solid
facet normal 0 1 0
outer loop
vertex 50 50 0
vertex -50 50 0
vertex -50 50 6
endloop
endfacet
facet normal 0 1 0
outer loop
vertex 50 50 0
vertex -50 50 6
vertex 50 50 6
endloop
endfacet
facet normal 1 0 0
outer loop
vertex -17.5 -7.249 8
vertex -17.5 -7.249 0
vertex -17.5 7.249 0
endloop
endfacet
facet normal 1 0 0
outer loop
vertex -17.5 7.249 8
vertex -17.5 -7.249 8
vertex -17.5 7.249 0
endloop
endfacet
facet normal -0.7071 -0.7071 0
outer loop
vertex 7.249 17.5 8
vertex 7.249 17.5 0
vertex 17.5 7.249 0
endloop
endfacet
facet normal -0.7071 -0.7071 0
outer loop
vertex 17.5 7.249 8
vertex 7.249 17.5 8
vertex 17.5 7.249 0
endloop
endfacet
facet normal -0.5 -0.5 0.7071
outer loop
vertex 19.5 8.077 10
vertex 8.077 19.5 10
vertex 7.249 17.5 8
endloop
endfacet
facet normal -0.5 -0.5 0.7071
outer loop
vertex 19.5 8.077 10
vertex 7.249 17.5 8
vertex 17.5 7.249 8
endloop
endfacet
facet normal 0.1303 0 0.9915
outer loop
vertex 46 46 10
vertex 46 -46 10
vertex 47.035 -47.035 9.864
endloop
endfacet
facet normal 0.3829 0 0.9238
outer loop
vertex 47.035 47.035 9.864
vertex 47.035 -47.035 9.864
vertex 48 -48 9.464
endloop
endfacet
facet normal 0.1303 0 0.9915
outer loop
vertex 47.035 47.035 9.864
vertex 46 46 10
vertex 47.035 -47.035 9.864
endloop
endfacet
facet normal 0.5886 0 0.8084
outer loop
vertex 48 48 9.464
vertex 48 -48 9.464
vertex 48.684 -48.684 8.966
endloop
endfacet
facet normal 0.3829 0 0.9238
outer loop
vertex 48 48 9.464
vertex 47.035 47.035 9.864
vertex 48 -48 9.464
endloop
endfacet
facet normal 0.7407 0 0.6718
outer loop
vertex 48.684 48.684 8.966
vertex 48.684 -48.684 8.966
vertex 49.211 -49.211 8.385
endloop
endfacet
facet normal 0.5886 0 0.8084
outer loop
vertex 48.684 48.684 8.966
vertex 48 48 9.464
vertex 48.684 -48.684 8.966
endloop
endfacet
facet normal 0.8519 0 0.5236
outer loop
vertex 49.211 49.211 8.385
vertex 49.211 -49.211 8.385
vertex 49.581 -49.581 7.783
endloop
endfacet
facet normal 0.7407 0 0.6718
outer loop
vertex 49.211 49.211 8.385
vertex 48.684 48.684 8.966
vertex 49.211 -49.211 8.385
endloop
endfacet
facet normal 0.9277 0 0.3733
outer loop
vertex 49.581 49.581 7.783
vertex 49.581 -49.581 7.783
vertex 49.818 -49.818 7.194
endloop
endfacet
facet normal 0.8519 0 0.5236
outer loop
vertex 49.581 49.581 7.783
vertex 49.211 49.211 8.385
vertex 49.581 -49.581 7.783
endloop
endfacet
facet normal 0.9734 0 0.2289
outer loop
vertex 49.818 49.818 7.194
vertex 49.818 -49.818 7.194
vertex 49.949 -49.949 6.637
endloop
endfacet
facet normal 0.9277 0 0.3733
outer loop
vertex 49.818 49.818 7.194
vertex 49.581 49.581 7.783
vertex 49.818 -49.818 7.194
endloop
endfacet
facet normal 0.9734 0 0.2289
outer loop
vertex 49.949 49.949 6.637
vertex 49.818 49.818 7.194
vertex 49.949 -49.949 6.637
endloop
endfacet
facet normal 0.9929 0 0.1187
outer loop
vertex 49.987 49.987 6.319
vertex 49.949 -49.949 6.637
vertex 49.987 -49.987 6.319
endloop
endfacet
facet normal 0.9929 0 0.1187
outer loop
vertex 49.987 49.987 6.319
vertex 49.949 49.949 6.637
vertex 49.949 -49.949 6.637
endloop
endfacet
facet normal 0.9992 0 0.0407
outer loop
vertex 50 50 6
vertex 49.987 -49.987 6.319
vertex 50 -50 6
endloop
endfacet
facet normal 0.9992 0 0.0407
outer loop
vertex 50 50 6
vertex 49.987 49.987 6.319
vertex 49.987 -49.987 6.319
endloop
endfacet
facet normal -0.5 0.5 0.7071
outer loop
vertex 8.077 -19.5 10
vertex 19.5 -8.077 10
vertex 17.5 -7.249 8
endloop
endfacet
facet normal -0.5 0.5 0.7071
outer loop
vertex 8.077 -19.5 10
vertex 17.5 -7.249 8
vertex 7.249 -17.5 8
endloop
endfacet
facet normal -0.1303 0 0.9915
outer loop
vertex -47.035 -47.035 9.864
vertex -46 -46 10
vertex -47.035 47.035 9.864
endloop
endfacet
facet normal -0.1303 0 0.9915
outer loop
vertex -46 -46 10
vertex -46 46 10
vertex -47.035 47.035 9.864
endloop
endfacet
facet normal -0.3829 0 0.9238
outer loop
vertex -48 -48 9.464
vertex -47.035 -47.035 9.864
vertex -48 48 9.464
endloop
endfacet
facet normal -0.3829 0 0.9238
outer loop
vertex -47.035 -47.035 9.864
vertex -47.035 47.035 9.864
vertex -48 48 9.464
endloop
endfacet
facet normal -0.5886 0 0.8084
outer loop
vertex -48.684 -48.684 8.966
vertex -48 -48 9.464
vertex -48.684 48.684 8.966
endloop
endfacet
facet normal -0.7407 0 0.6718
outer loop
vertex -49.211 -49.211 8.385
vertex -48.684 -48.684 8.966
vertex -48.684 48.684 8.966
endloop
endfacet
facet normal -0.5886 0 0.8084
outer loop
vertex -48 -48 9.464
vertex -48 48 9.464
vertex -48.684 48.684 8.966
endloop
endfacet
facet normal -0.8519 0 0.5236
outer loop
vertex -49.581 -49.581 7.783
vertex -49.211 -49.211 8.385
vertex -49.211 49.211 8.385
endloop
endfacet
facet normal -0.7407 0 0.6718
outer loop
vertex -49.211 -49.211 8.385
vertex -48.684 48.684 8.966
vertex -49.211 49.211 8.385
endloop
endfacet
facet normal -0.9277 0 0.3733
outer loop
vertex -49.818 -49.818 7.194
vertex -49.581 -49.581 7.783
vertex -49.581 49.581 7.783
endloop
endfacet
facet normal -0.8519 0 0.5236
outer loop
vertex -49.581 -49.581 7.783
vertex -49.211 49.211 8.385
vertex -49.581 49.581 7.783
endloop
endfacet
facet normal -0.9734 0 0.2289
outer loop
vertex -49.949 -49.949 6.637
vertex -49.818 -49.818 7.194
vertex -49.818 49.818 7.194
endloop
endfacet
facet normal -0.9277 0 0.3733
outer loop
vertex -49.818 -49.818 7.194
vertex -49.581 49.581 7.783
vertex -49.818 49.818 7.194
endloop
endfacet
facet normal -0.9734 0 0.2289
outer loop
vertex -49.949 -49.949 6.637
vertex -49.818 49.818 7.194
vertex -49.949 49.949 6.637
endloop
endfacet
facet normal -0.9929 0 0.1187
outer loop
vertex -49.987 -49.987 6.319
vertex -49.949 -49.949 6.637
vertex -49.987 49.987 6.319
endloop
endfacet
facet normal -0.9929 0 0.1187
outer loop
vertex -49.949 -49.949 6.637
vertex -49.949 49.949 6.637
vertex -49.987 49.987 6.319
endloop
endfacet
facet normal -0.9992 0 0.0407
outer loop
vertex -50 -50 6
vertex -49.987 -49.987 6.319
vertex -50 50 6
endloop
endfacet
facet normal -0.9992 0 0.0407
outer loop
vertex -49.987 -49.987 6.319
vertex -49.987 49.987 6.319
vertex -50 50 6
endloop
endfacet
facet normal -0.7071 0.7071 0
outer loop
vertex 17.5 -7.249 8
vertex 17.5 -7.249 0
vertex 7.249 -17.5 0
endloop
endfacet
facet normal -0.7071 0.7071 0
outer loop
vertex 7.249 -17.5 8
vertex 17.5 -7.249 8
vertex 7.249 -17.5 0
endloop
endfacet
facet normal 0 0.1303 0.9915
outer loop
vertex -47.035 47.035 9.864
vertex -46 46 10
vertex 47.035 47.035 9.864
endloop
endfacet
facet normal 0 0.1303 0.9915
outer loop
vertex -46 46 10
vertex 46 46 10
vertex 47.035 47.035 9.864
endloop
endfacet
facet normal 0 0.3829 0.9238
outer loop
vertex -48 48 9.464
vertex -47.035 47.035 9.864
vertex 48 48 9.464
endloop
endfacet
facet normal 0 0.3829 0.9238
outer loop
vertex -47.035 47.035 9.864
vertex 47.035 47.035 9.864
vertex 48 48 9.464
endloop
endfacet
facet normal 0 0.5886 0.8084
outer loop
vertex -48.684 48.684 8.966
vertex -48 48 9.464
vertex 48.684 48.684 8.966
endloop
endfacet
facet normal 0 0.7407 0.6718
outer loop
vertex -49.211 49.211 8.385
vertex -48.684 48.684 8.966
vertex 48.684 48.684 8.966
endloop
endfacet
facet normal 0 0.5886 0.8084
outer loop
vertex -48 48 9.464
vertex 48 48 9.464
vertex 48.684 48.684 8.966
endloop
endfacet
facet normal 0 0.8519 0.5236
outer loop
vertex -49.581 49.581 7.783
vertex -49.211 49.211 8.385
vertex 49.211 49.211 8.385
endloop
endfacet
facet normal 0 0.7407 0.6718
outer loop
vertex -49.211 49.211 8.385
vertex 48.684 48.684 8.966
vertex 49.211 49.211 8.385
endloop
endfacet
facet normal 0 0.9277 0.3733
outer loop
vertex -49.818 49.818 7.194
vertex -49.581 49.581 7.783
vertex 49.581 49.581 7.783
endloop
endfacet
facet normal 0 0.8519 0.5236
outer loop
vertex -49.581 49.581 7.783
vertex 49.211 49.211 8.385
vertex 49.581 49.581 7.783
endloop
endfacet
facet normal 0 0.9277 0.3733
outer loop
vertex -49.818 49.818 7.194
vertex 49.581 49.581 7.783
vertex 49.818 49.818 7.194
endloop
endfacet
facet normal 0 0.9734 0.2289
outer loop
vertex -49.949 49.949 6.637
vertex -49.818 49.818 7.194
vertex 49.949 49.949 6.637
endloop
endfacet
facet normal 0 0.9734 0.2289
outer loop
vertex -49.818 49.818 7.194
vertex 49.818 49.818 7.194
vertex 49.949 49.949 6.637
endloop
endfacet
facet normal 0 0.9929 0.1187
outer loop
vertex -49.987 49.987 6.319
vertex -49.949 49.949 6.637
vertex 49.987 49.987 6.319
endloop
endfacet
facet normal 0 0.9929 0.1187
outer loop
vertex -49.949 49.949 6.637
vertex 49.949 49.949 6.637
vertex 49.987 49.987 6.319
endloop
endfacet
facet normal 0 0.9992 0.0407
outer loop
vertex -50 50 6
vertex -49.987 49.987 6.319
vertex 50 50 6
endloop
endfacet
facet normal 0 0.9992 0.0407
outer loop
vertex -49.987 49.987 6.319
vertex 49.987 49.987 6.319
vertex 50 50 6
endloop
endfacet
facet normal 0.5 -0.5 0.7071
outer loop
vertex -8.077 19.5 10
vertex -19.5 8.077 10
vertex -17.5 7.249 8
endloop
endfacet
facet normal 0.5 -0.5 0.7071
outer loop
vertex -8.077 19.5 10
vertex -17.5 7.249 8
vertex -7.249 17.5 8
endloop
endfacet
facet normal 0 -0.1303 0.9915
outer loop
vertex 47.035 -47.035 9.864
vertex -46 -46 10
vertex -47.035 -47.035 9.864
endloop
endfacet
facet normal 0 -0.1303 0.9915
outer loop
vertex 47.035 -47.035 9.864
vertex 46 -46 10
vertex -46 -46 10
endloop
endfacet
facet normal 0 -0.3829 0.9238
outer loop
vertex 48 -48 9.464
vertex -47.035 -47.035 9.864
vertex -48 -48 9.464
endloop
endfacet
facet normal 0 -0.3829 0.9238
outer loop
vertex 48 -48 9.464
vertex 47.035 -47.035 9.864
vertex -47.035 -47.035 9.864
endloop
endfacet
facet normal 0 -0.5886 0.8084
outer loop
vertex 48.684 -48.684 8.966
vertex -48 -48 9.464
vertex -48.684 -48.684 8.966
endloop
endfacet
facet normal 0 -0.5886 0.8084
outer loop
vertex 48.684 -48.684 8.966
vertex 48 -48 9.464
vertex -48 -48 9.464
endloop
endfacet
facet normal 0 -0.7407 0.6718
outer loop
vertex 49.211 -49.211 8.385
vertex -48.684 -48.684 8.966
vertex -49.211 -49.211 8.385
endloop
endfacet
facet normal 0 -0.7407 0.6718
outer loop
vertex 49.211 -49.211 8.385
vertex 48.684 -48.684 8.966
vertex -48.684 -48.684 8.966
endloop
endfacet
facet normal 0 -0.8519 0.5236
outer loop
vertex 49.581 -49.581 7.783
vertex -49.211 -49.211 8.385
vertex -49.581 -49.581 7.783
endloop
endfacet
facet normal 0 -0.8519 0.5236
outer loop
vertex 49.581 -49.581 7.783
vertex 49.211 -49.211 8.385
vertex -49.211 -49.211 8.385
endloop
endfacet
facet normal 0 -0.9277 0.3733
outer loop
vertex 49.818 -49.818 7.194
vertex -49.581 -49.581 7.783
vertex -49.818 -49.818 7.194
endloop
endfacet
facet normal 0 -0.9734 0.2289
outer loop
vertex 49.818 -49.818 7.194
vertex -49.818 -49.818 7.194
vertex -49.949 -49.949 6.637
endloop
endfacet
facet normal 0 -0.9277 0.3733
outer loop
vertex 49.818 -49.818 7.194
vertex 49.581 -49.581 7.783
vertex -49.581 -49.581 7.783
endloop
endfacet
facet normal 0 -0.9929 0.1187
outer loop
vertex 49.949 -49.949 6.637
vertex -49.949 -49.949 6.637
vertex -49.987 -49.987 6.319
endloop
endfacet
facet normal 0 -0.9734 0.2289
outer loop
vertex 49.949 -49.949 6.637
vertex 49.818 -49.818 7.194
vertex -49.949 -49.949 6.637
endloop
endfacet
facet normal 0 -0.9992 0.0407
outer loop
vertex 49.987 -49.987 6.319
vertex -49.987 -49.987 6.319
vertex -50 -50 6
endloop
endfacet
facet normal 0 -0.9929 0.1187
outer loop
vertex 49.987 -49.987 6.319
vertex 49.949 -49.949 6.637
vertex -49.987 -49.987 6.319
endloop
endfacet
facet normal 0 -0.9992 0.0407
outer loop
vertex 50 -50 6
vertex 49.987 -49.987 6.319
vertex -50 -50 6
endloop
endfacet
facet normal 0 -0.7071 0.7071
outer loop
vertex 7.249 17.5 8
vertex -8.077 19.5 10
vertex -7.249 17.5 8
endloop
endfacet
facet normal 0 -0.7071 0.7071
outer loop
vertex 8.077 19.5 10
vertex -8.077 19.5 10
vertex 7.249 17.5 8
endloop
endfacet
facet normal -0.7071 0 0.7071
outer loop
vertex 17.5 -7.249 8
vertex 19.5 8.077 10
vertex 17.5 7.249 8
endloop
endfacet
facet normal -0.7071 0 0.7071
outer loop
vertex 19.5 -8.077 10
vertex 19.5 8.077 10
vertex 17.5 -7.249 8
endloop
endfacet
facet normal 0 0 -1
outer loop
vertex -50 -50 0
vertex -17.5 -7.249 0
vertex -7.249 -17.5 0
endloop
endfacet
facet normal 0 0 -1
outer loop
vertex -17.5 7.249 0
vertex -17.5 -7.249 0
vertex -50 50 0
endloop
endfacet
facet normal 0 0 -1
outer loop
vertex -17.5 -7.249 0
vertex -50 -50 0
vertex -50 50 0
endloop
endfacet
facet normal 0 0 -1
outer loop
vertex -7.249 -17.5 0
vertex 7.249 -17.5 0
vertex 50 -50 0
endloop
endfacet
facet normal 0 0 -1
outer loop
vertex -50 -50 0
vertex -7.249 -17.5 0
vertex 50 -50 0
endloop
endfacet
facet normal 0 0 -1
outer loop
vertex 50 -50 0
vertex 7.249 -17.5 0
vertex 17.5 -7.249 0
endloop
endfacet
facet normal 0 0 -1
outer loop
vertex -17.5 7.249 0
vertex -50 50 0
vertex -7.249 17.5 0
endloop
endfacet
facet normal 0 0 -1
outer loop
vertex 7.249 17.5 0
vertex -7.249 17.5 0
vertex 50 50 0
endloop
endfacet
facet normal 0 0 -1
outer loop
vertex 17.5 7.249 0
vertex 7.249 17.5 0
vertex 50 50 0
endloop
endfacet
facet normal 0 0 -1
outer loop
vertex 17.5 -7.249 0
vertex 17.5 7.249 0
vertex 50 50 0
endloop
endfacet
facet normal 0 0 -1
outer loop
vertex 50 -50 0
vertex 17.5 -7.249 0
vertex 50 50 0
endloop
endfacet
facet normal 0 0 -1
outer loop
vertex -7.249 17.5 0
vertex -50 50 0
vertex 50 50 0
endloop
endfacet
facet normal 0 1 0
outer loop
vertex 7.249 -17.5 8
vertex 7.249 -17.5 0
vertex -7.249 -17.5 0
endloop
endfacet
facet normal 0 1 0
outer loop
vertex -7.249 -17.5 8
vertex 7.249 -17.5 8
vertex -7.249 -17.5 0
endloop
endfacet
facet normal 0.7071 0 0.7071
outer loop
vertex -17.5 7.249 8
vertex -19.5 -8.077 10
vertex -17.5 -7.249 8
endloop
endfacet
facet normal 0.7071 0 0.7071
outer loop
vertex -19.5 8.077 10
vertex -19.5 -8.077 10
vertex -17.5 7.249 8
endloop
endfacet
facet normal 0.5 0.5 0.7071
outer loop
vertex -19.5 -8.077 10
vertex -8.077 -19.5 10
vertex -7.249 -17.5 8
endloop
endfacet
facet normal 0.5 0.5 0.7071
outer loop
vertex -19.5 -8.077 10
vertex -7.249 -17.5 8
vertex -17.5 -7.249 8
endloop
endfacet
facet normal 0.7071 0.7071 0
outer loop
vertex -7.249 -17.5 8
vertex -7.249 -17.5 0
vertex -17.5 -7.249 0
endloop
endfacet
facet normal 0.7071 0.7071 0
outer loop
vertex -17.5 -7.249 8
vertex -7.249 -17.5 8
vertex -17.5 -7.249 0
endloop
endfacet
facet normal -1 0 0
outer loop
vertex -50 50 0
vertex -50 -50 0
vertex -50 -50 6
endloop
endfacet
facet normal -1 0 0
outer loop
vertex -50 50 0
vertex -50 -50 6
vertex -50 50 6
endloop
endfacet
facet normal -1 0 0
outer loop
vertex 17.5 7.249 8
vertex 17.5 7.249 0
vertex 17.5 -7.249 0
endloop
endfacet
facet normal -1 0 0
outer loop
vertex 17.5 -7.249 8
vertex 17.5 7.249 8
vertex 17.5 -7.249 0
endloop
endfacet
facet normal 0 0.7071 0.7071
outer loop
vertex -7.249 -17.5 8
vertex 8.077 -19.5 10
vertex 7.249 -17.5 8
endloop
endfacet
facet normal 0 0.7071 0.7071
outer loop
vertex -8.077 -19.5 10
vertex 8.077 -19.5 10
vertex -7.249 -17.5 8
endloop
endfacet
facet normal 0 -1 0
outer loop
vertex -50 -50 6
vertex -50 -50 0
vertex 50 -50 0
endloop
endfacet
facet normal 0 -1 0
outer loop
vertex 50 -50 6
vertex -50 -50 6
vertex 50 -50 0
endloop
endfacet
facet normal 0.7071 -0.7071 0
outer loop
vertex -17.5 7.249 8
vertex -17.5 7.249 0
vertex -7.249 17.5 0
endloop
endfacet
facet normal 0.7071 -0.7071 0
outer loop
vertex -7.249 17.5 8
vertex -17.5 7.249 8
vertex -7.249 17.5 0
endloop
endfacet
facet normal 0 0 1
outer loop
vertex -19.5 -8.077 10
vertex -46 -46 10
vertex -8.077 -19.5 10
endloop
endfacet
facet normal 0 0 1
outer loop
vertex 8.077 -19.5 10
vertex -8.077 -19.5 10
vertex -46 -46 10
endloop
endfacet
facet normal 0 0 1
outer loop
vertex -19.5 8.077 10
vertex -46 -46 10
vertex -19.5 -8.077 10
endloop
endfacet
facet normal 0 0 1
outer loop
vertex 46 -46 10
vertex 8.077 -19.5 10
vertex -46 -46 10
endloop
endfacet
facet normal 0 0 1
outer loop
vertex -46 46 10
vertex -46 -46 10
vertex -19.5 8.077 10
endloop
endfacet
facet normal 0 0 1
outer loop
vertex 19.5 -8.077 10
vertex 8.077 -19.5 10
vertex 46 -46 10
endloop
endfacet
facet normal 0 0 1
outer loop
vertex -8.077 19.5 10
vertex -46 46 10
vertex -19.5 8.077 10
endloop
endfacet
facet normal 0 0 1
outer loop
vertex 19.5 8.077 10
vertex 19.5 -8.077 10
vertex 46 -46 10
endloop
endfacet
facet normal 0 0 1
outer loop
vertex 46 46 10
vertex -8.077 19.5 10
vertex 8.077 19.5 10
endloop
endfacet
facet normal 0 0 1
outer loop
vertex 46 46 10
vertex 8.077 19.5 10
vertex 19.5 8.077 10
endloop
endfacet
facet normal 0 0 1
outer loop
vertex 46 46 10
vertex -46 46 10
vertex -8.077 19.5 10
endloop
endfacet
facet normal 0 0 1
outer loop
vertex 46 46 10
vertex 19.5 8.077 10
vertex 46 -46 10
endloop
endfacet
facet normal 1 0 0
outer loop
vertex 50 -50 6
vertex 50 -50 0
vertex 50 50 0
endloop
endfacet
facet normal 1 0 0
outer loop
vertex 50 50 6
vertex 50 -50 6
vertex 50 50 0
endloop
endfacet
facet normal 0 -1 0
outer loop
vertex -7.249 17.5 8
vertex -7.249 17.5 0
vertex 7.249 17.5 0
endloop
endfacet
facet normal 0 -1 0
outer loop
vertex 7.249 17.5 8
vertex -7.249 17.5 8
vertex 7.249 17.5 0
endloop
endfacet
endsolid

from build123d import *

# Parameters (mm, degrees)
F0_W     = 100
F0_H     = 100
F1_DEPTH = 10
F2_SIZE  = 2
F3_R     = 4


with BuildPart() as f1:
    # F0 (on Top) → F1 (new body)
    with BuildSketch(Plane.XY):
        Rectangle(F0_W, F0_H)
        Polygon((-17.5, 7.248737), (-7.248737, 17.5), (7.248737, 17.5), (17.5, 7.248737), (17.5, -7.248737), (7.248737, -17.5), (-7.248737, -17.5), (-17.5, -7.248737), align=None, mode=Mode.SUBTRACT)
    extrude(amount=F1_DEPTH)

    # F2
    f2_edges = [f1.edges().sort_by_distance(p)[0] for p in [
        (0, 17.5, 10),
        (12.374369, 12.374369, 10),
        (17.5, 0, 10),
        (12.374369, -12.374369, 10),
        (0, -17.5, 10),
        (-12.374369, -12.374369, 10),
        (-17.5, 0, 10),
        (-12.374369, 12.374369, 10),
    ]]
    chamfer(f2_edges, length=F2_SIZE)

    # F3
    f3_edges = [f1.edges().sort_by_distance(p)[0] for p in [
        (0, 50, 10),
        (50, 0, 10),
        (-50, 0, 10),
        (0, -50, 10),
    ]]
    fillet(f3_edges, radius=F3_R)


solid = f1.part
